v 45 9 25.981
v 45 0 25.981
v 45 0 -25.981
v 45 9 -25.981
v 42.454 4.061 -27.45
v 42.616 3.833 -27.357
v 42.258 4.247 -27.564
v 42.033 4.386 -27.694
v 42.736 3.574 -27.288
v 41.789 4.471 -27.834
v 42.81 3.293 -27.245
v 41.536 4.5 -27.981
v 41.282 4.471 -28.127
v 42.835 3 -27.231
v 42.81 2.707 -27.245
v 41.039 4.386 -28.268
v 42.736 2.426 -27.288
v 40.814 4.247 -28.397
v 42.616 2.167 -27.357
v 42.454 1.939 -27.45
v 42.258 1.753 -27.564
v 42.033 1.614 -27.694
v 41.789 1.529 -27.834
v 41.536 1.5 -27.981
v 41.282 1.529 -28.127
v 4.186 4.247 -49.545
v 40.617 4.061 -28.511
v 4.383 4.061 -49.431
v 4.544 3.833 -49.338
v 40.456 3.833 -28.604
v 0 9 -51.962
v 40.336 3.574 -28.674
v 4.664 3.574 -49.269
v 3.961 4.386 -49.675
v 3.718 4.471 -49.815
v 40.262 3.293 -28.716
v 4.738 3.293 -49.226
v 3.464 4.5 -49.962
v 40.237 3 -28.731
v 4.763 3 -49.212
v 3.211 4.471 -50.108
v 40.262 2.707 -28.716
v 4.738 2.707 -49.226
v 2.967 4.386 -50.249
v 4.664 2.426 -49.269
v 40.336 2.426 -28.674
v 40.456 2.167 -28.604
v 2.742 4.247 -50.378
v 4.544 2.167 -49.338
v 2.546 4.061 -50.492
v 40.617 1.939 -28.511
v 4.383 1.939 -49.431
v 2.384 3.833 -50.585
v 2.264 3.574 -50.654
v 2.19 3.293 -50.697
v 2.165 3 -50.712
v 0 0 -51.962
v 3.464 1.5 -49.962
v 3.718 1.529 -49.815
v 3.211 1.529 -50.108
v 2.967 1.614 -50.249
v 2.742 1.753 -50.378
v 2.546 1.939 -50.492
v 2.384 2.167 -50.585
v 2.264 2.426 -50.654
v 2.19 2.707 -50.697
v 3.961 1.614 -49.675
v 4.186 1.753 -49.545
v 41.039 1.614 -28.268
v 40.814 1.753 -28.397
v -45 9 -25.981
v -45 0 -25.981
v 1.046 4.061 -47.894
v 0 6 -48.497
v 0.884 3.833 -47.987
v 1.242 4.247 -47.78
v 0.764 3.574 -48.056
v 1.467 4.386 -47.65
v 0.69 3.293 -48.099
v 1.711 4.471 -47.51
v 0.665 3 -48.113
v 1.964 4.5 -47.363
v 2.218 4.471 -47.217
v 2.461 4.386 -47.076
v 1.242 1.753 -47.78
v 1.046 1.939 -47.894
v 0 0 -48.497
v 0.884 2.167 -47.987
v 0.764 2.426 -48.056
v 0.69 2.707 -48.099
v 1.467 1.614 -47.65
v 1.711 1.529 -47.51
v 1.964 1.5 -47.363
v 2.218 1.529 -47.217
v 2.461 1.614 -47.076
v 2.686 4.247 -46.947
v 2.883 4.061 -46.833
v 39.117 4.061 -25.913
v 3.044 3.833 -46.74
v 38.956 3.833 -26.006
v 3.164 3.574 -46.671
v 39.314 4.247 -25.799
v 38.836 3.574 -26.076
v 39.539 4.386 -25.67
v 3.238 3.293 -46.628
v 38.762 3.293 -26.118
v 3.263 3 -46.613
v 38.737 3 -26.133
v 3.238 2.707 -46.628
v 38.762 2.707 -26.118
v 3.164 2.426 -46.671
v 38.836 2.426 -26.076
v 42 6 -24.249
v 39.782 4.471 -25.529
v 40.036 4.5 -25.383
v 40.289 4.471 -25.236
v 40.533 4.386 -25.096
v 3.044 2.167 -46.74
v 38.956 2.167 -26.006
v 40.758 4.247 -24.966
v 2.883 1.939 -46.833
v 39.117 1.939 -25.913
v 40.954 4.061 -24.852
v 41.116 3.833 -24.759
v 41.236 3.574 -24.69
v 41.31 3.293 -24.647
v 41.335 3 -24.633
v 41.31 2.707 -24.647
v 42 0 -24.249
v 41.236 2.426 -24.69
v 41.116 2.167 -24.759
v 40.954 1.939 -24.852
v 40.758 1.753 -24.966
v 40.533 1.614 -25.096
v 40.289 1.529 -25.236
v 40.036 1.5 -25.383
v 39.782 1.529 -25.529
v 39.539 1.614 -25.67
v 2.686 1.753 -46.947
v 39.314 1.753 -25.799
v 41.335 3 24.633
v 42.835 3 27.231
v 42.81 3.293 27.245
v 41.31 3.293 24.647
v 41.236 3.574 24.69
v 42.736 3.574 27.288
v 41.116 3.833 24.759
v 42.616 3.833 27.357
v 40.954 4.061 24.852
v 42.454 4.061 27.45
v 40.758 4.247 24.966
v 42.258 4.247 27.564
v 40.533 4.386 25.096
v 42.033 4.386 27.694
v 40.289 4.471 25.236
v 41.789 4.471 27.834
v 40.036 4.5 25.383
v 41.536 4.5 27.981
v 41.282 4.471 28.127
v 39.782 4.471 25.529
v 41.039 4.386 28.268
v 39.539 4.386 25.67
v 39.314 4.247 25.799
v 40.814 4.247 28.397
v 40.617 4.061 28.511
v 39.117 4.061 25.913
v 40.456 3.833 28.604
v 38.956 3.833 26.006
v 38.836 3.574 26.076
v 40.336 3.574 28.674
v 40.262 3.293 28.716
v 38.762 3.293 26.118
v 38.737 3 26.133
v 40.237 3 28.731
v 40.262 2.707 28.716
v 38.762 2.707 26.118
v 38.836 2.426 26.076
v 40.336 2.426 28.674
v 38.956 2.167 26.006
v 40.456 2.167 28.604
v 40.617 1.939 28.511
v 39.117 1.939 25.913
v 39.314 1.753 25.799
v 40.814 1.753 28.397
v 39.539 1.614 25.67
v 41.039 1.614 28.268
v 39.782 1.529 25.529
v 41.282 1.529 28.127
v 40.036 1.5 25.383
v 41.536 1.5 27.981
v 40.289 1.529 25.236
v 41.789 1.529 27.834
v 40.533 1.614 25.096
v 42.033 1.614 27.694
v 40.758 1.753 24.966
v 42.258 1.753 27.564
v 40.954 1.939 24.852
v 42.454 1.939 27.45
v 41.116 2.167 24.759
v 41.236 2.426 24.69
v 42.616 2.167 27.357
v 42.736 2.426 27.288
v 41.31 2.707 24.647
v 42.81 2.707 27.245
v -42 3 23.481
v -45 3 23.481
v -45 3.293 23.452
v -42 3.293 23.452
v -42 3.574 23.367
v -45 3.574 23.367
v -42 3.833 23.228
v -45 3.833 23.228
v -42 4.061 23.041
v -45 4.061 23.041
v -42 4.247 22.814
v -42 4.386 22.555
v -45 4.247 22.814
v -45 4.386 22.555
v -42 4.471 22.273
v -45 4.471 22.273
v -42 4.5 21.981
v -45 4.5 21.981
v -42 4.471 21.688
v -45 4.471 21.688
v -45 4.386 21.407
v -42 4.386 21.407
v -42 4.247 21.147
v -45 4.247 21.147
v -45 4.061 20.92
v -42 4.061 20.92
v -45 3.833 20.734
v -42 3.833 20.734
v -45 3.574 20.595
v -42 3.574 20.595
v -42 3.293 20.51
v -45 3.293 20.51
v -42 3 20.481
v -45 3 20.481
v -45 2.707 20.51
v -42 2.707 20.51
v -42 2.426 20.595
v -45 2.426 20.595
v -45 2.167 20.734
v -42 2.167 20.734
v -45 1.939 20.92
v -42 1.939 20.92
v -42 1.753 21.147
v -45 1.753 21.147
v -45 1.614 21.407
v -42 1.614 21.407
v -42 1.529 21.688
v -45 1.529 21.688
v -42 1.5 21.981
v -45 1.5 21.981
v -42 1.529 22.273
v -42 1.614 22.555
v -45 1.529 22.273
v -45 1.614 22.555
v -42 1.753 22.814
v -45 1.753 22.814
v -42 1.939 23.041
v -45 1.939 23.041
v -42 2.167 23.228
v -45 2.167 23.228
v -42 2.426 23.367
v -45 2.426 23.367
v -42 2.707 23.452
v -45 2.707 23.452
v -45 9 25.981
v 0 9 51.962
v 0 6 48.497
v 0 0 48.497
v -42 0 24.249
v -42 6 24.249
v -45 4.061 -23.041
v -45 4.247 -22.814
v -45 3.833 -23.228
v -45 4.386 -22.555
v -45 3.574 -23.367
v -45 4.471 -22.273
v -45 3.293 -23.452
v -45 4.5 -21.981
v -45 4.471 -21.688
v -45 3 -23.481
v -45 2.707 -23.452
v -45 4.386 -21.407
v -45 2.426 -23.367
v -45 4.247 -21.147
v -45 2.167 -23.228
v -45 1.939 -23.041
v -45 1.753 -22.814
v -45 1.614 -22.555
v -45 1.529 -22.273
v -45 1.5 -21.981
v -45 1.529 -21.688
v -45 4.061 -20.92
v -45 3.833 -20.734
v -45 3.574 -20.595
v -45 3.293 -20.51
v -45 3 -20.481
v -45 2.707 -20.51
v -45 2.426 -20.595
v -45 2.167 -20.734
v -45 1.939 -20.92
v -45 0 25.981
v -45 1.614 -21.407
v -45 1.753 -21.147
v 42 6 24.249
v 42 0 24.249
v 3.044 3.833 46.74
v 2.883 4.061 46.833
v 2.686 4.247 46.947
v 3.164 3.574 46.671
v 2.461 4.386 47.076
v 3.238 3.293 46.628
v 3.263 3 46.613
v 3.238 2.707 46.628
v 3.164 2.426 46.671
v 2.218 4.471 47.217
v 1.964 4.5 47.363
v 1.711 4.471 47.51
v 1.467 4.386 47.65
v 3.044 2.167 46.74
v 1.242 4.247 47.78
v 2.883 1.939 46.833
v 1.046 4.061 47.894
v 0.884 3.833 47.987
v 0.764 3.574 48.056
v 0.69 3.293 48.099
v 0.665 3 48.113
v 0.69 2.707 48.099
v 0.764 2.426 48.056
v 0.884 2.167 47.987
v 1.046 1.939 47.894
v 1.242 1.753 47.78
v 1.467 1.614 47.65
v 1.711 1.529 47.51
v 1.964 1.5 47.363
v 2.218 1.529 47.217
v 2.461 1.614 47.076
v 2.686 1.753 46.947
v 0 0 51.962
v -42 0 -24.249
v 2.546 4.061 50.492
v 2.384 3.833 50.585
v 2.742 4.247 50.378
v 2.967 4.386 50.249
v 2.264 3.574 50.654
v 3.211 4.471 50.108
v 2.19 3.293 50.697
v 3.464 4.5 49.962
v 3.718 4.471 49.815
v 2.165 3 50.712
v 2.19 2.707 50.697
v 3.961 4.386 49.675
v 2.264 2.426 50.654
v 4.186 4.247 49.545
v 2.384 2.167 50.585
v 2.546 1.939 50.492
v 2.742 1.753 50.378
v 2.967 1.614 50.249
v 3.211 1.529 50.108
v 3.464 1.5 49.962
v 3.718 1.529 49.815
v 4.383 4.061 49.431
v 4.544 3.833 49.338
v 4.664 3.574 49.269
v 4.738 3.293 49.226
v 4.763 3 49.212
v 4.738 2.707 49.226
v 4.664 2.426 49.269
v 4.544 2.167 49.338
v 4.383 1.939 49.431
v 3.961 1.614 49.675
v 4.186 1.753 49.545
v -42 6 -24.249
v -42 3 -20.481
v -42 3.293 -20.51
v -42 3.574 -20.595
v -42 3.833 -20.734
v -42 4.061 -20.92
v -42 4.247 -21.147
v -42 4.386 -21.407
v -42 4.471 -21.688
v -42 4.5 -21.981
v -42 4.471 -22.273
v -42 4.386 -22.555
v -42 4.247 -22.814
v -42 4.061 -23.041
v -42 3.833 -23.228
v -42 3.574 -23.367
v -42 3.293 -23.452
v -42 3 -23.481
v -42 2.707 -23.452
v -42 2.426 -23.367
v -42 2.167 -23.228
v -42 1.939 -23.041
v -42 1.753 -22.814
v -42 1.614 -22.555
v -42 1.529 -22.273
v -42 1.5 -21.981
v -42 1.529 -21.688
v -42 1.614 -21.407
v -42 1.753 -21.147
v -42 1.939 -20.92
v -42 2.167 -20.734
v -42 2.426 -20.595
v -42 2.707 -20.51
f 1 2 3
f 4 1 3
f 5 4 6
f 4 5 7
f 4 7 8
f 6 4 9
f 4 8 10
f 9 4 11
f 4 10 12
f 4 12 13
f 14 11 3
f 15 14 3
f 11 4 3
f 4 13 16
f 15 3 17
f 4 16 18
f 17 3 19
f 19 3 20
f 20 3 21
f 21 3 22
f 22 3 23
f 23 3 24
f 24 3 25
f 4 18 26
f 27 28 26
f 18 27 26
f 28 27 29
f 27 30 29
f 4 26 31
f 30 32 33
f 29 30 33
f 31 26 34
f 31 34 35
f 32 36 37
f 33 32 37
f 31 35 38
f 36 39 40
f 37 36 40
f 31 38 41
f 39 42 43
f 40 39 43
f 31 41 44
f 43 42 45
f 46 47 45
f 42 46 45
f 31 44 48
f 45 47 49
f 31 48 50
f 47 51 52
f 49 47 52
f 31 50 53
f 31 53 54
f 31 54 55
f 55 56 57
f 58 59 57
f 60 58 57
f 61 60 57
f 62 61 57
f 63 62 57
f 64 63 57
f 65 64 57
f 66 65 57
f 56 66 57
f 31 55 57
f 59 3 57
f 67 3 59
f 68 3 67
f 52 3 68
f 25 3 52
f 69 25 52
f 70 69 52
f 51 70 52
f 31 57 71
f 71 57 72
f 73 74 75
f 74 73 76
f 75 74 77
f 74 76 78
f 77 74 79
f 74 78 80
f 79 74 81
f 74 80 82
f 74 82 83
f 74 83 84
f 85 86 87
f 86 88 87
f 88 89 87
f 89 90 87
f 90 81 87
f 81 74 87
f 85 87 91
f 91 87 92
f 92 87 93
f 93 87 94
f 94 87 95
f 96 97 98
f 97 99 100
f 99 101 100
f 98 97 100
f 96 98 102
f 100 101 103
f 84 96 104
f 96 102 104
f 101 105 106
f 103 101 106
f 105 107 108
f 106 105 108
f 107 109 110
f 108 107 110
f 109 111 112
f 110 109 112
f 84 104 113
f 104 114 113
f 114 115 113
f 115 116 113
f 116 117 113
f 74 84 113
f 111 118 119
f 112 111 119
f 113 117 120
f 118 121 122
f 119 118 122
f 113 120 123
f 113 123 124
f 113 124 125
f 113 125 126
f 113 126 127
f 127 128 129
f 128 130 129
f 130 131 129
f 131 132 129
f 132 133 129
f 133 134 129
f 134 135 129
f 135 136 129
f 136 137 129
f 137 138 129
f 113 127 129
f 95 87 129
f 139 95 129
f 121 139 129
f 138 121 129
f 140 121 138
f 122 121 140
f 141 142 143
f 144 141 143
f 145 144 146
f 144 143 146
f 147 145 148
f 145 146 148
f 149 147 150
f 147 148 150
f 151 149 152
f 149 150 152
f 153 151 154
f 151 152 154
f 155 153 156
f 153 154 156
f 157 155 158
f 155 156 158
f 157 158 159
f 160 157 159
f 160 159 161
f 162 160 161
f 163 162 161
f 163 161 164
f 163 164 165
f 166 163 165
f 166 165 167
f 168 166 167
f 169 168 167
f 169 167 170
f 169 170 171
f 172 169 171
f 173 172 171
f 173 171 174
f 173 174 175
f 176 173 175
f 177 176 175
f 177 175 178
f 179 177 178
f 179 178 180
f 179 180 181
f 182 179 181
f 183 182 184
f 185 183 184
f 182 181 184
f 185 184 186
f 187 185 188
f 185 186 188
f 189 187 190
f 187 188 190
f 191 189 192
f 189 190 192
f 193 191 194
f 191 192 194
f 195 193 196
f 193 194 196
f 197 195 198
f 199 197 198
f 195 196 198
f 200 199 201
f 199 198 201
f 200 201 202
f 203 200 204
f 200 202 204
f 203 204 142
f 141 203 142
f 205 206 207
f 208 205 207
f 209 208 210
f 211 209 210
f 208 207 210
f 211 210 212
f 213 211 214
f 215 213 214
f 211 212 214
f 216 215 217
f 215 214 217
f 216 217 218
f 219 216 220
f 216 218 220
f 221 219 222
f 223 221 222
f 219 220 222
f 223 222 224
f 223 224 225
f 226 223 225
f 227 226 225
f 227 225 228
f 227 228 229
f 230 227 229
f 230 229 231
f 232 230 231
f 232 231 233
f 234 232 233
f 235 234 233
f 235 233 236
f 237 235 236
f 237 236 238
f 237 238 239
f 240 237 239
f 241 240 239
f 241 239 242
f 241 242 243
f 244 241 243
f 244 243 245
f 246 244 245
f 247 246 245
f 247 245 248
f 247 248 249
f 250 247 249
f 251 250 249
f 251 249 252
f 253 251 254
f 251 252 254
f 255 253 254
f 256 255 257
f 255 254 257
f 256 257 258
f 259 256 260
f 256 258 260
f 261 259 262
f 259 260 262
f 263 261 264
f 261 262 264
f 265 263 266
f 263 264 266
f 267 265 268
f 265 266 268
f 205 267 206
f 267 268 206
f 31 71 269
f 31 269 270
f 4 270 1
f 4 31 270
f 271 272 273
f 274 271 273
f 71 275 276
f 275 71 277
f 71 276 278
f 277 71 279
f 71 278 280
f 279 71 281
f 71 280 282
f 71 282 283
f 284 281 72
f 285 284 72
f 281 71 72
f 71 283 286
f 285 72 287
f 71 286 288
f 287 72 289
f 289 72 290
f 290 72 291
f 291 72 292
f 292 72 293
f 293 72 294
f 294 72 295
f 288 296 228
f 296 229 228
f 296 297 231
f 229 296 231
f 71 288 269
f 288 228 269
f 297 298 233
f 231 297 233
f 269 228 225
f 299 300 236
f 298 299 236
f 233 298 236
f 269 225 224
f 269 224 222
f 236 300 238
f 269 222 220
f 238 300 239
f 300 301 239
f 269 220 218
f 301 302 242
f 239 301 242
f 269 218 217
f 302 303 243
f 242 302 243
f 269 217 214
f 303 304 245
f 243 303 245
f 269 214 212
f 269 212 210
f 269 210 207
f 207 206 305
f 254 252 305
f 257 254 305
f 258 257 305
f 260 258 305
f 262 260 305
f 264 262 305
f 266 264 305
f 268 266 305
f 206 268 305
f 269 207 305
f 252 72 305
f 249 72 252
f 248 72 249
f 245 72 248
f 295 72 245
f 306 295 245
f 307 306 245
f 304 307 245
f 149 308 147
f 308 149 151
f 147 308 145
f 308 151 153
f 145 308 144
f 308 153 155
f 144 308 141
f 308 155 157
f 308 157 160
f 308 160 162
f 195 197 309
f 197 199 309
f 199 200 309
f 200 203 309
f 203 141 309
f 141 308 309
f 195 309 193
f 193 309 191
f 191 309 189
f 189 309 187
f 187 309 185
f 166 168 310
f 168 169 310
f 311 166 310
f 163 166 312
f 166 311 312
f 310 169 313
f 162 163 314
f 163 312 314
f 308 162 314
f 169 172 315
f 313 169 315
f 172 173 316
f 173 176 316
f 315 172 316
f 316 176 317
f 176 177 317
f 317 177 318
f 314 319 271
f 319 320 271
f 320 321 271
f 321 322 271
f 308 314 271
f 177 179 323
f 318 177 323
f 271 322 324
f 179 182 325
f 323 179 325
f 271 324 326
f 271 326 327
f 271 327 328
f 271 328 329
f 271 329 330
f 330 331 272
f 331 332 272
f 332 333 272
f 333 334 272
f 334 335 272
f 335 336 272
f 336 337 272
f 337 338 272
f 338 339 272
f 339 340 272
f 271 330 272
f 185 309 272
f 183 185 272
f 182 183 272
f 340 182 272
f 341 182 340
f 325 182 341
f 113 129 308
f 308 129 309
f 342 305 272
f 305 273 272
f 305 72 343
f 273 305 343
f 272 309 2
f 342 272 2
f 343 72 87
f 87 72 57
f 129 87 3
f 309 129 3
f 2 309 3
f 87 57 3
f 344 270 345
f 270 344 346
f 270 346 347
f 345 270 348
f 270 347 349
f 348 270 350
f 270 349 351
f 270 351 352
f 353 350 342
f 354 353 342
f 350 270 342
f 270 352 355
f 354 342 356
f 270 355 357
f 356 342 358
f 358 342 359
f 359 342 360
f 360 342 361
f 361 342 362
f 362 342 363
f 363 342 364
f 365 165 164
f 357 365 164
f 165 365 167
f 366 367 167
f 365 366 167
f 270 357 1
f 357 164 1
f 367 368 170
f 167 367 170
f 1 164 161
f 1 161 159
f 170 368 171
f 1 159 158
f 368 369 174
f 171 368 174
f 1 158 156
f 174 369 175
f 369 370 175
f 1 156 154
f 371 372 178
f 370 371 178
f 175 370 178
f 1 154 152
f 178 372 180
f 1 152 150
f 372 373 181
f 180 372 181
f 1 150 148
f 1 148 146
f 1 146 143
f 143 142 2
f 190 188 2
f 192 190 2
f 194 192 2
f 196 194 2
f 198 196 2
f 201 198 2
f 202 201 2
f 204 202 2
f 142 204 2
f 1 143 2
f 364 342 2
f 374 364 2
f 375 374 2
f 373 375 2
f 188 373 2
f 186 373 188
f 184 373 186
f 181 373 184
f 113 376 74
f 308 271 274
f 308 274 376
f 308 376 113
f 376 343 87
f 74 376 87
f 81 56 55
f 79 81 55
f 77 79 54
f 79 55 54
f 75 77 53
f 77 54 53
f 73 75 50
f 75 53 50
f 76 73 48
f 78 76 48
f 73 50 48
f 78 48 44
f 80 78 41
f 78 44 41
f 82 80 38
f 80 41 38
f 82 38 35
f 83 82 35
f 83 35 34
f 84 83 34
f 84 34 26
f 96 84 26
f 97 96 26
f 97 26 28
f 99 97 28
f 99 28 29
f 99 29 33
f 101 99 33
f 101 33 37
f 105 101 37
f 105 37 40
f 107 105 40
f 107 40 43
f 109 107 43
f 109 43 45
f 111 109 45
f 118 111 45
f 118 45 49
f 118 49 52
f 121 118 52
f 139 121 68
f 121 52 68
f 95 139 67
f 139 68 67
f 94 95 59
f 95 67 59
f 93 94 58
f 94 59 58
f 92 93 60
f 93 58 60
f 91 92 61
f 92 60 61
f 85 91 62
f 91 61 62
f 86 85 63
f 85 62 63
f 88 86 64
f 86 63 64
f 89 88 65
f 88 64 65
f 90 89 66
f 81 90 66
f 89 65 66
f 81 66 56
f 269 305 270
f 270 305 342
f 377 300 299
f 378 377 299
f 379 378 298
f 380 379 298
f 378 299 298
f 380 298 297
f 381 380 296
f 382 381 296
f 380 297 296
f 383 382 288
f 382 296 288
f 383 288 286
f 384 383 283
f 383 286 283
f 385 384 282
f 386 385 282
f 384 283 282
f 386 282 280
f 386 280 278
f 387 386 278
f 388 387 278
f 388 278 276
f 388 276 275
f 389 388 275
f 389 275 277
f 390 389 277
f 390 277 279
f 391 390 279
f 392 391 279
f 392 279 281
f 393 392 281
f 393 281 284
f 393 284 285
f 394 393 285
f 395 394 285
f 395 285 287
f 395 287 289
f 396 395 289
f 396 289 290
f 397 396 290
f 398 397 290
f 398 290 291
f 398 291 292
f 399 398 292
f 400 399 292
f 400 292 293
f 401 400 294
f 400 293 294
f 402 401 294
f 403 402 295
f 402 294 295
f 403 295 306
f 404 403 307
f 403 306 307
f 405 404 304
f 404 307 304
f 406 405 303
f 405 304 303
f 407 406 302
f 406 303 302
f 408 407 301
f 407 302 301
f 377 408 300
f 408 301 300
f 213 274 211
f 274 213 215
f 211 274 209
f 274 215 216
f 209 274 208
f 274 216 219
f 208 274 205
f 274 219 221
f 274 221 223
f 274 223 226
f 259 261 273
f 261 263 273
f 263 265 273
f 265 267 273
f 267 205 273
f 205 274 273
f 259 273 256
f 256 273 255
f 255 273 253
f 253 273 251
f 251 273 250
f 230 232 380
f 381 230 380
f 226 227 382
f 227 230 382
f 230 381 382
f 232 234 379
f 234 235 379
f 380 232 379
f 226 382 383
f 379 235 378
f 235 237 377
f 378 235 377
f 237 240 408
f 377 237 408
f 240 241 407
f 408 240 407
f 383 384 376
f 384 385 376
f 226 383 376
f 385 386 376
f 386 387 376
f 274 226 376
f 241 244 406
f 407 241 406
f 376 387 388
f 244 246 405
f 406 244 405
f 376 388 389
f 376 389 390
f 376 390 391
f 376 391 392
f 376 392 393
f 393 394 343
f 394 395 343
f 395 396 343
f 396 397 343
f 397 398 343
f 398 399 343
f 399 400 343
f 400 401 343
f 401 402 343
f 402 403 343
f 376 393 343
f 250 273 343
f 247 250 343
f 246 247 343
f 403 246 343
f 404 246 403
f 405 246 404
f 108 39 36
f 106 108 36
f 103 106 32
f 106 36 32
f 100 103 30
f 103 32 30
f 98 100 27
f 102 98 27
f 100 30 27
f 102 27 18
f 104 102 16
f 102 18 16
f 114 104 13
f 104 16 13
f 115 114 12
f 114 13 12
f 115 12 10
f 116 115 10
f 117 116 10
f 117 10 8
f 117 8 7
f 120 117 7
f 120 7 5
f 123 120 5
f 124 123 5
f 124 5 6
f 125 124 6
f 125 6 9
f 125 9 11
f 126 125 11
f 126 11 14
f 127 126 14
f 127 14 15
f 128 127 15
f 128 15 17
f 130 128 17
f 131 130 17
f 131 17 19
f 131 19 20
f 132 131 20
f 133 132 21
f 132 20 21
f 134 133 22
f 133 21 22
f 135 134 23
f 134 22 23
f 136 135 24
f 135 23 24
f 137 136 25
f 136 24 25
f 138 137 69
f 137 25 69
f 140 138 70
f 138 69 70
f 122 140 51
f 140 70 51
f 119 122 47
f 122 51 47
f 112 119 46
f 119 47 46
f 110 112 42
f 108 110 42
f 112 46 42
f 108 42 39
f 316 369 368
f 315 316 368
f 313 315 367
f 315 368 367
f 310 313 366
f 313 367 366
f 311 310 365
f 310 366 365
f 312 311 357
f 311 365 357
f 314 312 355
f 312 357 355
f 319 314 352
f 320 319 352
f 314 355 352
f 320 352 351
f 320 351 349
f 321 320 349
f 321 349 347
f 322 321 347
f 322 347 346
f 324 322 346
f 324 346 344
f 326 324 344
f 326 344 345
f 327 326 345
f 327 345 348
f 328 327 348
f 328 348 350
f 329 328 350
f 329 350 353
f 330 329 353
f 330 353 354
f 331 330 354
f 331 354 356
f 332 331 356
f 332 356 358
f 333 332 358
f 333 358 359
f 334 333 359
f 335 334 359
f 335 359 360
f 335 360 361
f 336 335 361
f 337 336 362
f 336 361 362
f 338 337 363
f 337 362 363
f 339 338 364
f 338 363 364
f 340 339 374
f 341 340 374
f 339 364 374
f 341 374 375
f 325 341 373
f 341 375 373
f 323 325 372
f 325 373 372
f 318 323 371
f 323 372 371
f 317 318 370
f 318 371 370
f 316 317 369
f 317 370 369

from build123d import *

# Parameters (mm, degrees)
BOSS_EXTRUDE2_DEPTH = 9
CUT_EXTRUDE3_DEPTH  = 6
SKETCH5_R           = 1.5
CUT_EXTRUDE7_DEPTH  = 5
SKETCH7_R           = 1.5
CUT_EXTRUDE8_DEPTH  = 5
SKETCH8_R           = 1.5
CUT_EXTRUDE9_DEPTH  = 5


with BuildPart() as part:
    # Sketch1 → Boss-Extrude2 (new body)
    with BuildSketch(Plane(origin=(0, 0, 0), x_dir=(1, 0, 0), z_dir=(0, 1, 0))):
        Polygon((0, 51.961524227), (-45, 25.980762114), (-45, -25.980762114), (0, -51.961524227), (45, -25.980762114), (45, 25.980762114), align=None)
    extrude(amount=BOSS_EXTRUDE2_DEPTH)

    # Sketch4 → Cut-Extrude3 (cut)
    with BuildSketch(Plane.XZ):
        Polygon((0, 48.497422612), (-42, 24.248711306), (-42, -24.248711306), (0, -48.497422612), (42, -24.248711306), (42, 24.248711306), align=None)
    extrude(amount=-CUT_EXTRUDE3_DEPTH, mode=Mode.SUBTRACT)

    # Sketch5 → Cut-Extrude7 (cut)
    with BuildSketch(Plane.ZY.offset(45)):
        with Locations((-21.980762114, 3)):
            Circle(SKETCH5_R)
        with Locations((21.980762114, 3)):
            Circle(SKETCH5_R)
    extrude(amount=-CUT_EXTRUDE7_DEPTH, mode=Mode.SUBTRACT)

    # Sketch7 → Cut-Extrude8 (cut)
    with BuildSketch(Plane(origin=(22.5, 0, 38.97114317), x_dir=(0.8660254037844346, 0, -0.5000000000000071), z_dir=(0.5000000000000071, 0, 0.8660254037844346))):
        with Locations((-21.980762114, 3)):
            Circle(SKETCH7_R)
        with Locations((21.980762114, 3)):
            Circle(SKETCH7_R)
    extrude(amount=-CUT_EXTRUDE8_DEPTH, mode=Mode.SUBTRACT)

    # Sketch8 → Cut-Extrude9 (cut)
    with BuildSketch(Plane(origin=(22.5, 0, -38.97114317), x_dir=(-0.8660254037844414, 0, -0.49999999999999517), z_dir=(0.49999999999999517, 0, -0.8660254037844414))):
        with Locations((-21.980762114, 3)):
            Circle(SKETCH8_R)
        with Locations((21.980762114, 3)):
            Circle(SKETCH8_R)
    extrude(amount=-CUT_EXTRUDE9_DEPTH, mode=Mode.SUBTRACT)


solid = part.part
